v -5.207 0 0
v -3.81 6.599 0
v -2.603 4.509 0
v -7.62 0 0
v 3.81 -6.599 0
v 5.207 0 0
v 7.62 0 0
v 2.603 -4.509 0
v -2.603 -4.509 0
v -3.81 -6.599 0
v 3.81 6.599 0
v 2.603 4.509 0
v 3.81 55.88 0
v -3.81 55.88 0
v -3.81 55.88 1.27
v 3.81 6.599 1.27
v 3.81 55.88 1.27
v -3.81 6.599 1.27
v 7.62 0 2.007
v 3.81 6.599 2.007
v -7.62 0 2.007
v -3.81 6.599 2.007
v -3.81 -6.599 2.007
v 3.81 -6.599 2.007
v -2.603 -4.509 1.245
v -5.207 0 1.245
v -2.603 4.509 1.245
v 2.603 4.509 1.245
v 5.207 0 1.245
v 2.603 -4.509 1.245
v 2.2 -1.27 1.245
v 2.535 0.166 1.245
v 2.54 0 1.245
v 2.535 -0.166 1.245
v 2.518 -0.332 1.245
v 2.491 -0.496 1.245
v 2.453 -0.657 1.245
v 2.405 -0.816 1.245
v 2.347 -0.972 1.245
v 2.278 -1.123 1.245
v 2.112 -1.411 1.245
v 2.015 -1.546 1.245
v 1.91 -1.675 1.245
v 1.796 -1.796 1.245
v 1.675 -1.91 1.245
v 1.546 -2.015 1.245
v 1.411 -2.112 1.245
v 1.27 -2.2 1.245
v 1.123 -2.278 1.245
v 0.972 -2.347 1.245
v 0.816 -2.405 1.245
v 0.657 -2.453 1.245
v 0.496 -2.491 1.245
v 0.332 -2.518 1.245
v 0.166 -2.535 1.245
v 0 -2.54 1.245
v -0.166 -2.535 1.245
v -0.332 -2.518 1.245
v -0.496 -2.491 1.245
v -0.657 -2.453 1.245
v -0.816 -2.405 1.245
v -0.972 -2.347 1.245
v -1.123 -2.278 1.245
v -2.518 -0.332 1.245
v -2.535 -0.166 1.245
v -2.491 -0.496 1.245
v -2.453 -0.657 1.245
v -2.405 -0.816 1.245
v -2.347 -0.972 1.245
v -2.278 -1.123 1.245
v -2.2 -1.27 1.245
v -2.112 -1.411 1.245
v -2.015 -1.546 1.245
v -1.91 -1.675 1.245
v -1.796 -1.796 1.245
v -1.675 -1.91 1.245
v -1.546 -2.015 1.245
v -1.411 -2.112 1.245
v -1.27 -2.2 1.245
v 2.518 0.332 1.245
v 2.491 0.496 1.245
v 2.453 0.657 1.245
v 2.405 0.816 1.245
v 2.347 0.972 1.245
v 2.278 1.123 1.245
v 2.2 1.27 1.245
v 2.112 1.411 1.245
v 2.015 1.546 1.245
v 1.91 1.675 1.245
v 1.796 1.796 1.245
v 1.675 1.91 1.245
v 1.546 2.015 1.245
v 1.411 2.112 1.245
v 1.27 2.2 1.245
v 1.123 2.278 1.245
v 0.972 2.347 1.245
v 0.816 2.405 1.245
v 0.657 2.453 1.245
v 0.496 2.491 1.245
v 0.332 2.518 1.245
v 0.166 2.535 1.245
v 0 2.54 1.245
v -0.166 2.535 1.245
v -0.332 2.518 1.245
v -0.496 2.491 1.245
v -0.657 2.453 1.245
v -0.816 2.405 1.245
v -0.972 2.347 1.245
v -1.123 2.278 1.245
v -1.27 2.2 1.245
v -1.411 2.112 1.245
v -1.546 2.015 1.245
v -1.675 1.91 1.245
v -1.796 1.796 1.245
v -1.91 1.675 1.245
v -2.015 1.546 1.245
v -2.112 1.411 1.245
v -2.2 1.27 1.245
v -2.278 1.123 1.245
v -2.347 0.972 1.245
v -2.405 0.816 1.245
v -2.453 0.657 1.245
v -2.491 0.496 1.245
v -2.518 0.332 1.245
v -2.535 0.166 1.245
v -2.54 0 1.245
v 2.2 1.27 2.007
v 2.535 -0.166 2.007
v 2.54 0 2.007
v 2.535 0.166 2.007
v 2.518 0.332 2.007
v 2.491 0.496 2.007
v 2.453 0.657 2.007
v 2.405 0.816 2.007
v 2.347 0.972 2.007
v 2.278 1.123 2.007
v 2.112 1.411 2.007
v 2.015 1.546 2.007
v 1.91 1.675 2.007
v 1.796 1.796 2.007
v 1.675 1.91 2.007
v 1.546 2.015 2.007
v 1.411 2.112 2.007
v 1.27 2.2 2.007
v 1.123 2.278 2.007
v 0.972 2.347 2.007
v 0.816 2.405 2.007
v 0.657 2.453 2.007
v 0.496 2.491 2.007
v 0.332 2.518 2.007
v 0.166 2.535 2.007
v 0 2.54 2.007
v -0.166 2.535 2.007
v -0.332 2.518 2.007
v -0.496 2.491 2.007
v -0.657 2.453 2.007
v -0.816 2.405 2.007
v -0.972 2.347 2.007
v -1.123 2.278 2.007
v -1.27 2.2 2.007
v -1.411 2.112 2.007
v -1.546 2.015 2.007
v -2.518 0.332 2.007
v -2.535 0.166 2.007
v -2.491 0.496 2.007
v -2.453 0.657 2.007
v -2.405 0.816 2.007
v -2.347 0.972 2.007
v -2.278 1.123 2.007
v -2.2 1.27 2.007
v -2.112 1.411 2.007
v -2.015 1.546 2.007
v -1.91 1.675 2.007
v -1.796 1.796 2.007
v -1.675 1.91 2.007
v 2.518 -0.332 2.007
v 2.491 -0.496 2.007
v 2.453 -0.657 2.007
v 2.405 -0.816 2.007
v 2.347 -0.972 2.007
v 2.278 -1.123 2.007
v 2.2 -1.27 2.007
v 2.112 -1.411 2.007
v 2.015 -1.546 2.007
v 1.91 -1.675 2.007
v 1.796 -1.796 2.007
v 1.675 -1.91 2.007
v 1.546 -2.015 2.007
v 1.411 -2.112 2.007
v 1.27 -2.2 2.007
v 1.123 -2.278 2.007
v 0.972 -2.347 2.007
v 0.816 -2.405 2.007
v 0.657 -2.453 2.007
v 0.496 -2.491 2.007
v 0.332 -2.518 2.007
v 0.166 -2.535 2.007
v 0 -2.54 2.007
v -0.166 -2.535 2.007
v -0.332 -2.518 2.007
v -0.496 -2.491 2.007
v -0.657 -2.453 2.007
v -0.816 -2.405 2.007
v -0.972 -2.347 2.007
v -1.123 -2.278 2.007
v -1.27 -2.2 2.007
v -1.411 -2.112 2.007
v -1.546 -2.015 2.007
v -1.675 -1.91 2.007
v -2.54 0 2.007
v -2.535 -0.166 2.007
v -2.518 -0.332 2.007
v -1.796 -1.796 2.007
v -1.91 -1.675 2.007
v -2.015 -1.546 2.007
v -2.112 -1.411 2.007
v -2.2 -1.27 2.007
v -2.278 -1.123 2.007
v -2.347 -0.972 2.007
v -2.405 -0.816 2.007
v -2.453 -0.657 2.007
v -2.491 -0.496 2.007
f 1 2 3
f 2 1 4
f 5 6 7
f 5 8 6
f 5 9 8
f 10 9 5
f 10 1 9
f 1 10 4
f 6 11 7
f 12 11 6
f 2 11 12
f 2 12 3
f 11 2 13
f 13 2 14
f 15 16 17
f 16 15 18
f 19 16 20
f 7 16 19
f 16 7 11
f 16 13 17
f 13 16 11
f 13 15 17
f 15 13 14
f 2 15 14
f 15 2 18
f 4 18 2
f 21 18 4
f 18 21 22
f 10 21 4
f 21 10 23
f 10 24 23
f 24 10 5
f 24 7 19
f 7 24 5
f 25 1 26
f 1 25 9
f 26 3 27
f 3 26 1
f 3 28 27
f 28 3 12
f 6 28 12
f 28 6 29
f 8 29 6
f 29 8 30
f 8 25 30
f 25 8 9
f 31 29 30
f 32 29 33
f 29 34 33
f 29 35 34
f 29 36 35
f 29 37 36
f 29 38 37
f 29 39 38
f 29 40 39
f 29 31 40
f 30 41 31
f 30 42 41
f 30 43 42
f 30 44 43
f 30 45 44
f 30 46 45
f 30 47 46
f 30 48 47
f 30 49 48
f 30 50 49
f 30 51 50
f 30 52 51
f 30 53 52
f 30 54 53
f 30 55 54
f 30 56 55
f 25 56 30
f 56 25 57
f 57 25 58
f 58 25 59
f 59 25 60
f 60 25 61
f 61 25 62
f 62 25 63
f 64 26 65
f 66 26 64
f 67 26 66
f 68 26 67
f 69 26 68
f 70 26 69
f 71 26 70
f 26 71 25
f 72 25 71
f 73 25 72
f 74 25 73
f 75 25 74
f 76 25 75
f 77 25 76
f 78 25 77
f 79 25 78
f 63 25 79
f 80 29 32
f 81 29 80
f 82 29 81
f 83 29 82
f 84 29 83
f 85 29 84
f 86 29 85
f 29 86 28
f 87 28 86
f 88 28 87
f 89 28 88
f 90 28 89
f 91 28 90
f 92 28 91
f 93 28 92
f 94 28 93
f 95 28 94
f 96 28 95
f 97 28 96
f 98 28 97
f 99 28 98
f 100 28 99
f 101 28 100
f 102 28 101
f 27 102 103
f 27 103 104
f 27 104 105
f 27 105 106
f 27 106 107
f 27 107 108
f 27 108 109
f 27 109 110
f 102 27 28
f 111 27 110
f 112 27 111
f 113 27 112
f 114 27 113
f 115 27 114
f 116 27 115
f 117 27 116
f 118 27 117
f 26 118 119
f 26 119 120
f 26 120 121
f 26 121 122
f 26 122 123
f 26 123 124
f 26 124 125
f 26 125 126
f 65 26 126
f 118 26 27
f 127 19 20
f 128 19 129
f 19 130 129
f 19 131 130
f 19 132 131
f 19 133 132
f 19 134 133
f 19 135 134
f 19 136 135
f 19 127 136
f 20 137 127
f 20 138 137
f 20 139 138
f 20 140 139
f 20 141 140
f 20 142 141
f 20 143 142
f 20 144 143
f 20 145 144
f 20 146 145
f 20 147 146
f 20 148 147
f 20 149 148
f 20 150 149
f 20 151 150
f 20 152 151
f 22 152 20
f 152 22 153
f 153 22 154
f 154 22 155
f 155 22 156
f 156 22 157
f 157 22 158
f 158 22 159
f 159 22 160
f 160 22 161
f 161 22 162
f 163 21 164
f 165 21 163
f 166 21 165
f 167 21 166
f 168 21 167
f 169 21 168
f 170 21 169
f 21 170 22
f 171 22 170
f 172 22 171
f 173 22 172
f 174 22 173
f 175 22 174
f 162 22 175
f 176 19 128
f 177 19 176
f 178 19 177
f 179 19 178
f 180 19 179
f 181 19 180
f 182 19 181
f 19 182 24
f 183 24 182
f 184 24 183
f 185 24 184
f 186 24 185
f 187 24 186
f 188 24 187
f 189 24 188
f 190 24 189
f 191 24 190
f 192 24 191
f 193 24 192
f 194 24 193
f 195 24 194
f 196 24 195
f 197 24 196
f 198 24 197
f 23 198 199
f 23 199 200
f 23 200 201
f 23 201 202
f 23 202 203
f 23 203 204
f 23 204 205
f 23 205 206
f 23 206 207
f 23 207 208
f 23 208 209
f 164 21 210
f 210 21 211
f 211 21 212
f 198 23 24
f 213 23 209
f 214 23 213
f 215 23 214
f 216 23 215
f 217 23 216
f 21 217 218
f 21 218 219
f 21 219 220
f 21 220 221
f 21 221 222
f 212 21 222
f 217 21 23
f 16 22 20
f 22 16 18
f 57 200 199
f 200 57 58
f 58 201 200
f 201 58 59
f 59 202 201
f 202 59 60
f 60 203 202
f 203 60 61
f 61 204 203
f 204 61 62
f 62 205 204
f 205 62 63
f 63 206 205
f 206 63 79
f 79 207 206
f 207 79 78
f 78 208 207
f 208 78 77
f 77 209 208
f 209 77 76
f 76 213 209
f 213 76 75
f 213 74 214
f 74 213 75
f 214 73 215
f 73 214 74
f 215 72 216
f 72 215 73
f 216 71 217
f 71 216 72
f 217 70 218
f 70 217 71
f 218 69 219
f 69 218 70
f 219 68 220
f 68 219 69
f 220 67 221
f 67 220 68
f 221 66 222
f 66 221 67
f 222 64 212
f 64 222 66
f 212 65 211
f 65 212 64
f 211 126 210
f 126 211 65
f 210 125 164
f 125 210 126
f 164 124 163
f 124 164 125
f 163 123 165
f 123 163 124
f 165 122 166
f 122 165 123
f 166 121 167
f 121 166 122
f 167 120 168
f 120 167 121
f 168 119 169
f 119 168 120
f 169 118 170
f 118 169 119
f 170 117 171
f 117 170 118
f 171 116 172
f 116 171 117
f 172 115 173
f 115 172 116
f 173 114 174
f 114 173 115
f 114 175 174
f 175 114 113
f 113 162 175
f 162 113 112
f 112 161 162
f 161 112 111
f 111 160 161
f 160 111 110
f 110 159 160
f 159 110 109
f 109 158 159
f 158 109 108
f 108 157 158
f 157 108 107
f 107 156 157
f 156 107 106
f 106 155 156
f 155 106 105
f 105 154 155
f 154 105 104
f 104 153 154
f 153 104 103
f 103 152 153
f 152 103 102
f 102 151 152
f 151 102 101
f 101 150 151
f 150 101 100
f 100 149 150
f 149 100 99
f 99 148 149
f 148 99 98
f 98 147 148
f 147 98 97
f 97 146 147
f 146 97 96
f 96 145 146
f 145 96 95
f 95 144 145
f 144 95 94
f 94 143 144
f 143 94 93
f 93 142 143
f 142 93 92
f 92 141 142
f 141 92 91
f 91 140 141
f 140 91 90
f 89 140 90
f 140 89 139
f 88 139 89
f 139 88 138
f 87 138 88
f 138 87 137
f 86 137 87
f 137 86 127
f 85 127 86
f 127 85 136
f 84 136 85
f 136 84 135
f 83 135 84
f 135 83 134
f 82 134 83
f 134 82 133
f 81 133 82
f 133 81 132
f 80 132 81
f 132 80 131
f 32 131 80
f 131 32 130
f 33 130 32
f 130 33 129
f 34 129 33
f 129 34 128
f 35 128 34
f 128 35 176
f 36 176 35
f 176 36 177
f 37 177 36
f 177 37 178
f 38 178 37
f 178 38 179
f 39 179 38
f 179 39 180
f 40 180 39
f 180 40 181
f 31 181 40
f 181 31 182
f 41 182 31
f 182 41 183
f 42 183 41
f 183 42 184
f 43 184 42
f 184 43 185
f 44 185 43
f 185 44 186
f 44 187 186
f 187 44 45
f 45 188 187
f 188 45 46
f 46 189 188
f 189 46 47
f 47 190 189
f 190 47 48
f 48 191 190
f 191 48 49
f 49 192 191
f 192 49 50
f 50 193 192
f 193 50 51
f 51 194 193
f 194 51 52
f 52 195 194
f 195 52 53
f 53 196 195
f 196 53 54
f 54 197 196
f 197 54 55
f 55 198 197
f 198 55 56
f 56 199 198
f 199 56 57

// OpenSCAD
ViewScale = [0.0254, 0.0254, 0.0254];

module tool()
{
    // linext 120
    // hole 200

    linear_extrude(50)
    difference() {
        union() {
            circle(600/2, $fn=6);
            translate([0, 1200, 0])
            square([300, 2000], center=true);
        }
        circle(410/2, $fn=6);
    }

    translate([0, 0, 49])
    linear_extrude(30)
    difference() {
        circle(600/2, $fn=6);
        circle(200/2, $fn=96);
    }

}

module forViewing()
{
    tool();
}

module forPrinting()
{
}

scale(ViewScale)
{
    forViewing();
}
